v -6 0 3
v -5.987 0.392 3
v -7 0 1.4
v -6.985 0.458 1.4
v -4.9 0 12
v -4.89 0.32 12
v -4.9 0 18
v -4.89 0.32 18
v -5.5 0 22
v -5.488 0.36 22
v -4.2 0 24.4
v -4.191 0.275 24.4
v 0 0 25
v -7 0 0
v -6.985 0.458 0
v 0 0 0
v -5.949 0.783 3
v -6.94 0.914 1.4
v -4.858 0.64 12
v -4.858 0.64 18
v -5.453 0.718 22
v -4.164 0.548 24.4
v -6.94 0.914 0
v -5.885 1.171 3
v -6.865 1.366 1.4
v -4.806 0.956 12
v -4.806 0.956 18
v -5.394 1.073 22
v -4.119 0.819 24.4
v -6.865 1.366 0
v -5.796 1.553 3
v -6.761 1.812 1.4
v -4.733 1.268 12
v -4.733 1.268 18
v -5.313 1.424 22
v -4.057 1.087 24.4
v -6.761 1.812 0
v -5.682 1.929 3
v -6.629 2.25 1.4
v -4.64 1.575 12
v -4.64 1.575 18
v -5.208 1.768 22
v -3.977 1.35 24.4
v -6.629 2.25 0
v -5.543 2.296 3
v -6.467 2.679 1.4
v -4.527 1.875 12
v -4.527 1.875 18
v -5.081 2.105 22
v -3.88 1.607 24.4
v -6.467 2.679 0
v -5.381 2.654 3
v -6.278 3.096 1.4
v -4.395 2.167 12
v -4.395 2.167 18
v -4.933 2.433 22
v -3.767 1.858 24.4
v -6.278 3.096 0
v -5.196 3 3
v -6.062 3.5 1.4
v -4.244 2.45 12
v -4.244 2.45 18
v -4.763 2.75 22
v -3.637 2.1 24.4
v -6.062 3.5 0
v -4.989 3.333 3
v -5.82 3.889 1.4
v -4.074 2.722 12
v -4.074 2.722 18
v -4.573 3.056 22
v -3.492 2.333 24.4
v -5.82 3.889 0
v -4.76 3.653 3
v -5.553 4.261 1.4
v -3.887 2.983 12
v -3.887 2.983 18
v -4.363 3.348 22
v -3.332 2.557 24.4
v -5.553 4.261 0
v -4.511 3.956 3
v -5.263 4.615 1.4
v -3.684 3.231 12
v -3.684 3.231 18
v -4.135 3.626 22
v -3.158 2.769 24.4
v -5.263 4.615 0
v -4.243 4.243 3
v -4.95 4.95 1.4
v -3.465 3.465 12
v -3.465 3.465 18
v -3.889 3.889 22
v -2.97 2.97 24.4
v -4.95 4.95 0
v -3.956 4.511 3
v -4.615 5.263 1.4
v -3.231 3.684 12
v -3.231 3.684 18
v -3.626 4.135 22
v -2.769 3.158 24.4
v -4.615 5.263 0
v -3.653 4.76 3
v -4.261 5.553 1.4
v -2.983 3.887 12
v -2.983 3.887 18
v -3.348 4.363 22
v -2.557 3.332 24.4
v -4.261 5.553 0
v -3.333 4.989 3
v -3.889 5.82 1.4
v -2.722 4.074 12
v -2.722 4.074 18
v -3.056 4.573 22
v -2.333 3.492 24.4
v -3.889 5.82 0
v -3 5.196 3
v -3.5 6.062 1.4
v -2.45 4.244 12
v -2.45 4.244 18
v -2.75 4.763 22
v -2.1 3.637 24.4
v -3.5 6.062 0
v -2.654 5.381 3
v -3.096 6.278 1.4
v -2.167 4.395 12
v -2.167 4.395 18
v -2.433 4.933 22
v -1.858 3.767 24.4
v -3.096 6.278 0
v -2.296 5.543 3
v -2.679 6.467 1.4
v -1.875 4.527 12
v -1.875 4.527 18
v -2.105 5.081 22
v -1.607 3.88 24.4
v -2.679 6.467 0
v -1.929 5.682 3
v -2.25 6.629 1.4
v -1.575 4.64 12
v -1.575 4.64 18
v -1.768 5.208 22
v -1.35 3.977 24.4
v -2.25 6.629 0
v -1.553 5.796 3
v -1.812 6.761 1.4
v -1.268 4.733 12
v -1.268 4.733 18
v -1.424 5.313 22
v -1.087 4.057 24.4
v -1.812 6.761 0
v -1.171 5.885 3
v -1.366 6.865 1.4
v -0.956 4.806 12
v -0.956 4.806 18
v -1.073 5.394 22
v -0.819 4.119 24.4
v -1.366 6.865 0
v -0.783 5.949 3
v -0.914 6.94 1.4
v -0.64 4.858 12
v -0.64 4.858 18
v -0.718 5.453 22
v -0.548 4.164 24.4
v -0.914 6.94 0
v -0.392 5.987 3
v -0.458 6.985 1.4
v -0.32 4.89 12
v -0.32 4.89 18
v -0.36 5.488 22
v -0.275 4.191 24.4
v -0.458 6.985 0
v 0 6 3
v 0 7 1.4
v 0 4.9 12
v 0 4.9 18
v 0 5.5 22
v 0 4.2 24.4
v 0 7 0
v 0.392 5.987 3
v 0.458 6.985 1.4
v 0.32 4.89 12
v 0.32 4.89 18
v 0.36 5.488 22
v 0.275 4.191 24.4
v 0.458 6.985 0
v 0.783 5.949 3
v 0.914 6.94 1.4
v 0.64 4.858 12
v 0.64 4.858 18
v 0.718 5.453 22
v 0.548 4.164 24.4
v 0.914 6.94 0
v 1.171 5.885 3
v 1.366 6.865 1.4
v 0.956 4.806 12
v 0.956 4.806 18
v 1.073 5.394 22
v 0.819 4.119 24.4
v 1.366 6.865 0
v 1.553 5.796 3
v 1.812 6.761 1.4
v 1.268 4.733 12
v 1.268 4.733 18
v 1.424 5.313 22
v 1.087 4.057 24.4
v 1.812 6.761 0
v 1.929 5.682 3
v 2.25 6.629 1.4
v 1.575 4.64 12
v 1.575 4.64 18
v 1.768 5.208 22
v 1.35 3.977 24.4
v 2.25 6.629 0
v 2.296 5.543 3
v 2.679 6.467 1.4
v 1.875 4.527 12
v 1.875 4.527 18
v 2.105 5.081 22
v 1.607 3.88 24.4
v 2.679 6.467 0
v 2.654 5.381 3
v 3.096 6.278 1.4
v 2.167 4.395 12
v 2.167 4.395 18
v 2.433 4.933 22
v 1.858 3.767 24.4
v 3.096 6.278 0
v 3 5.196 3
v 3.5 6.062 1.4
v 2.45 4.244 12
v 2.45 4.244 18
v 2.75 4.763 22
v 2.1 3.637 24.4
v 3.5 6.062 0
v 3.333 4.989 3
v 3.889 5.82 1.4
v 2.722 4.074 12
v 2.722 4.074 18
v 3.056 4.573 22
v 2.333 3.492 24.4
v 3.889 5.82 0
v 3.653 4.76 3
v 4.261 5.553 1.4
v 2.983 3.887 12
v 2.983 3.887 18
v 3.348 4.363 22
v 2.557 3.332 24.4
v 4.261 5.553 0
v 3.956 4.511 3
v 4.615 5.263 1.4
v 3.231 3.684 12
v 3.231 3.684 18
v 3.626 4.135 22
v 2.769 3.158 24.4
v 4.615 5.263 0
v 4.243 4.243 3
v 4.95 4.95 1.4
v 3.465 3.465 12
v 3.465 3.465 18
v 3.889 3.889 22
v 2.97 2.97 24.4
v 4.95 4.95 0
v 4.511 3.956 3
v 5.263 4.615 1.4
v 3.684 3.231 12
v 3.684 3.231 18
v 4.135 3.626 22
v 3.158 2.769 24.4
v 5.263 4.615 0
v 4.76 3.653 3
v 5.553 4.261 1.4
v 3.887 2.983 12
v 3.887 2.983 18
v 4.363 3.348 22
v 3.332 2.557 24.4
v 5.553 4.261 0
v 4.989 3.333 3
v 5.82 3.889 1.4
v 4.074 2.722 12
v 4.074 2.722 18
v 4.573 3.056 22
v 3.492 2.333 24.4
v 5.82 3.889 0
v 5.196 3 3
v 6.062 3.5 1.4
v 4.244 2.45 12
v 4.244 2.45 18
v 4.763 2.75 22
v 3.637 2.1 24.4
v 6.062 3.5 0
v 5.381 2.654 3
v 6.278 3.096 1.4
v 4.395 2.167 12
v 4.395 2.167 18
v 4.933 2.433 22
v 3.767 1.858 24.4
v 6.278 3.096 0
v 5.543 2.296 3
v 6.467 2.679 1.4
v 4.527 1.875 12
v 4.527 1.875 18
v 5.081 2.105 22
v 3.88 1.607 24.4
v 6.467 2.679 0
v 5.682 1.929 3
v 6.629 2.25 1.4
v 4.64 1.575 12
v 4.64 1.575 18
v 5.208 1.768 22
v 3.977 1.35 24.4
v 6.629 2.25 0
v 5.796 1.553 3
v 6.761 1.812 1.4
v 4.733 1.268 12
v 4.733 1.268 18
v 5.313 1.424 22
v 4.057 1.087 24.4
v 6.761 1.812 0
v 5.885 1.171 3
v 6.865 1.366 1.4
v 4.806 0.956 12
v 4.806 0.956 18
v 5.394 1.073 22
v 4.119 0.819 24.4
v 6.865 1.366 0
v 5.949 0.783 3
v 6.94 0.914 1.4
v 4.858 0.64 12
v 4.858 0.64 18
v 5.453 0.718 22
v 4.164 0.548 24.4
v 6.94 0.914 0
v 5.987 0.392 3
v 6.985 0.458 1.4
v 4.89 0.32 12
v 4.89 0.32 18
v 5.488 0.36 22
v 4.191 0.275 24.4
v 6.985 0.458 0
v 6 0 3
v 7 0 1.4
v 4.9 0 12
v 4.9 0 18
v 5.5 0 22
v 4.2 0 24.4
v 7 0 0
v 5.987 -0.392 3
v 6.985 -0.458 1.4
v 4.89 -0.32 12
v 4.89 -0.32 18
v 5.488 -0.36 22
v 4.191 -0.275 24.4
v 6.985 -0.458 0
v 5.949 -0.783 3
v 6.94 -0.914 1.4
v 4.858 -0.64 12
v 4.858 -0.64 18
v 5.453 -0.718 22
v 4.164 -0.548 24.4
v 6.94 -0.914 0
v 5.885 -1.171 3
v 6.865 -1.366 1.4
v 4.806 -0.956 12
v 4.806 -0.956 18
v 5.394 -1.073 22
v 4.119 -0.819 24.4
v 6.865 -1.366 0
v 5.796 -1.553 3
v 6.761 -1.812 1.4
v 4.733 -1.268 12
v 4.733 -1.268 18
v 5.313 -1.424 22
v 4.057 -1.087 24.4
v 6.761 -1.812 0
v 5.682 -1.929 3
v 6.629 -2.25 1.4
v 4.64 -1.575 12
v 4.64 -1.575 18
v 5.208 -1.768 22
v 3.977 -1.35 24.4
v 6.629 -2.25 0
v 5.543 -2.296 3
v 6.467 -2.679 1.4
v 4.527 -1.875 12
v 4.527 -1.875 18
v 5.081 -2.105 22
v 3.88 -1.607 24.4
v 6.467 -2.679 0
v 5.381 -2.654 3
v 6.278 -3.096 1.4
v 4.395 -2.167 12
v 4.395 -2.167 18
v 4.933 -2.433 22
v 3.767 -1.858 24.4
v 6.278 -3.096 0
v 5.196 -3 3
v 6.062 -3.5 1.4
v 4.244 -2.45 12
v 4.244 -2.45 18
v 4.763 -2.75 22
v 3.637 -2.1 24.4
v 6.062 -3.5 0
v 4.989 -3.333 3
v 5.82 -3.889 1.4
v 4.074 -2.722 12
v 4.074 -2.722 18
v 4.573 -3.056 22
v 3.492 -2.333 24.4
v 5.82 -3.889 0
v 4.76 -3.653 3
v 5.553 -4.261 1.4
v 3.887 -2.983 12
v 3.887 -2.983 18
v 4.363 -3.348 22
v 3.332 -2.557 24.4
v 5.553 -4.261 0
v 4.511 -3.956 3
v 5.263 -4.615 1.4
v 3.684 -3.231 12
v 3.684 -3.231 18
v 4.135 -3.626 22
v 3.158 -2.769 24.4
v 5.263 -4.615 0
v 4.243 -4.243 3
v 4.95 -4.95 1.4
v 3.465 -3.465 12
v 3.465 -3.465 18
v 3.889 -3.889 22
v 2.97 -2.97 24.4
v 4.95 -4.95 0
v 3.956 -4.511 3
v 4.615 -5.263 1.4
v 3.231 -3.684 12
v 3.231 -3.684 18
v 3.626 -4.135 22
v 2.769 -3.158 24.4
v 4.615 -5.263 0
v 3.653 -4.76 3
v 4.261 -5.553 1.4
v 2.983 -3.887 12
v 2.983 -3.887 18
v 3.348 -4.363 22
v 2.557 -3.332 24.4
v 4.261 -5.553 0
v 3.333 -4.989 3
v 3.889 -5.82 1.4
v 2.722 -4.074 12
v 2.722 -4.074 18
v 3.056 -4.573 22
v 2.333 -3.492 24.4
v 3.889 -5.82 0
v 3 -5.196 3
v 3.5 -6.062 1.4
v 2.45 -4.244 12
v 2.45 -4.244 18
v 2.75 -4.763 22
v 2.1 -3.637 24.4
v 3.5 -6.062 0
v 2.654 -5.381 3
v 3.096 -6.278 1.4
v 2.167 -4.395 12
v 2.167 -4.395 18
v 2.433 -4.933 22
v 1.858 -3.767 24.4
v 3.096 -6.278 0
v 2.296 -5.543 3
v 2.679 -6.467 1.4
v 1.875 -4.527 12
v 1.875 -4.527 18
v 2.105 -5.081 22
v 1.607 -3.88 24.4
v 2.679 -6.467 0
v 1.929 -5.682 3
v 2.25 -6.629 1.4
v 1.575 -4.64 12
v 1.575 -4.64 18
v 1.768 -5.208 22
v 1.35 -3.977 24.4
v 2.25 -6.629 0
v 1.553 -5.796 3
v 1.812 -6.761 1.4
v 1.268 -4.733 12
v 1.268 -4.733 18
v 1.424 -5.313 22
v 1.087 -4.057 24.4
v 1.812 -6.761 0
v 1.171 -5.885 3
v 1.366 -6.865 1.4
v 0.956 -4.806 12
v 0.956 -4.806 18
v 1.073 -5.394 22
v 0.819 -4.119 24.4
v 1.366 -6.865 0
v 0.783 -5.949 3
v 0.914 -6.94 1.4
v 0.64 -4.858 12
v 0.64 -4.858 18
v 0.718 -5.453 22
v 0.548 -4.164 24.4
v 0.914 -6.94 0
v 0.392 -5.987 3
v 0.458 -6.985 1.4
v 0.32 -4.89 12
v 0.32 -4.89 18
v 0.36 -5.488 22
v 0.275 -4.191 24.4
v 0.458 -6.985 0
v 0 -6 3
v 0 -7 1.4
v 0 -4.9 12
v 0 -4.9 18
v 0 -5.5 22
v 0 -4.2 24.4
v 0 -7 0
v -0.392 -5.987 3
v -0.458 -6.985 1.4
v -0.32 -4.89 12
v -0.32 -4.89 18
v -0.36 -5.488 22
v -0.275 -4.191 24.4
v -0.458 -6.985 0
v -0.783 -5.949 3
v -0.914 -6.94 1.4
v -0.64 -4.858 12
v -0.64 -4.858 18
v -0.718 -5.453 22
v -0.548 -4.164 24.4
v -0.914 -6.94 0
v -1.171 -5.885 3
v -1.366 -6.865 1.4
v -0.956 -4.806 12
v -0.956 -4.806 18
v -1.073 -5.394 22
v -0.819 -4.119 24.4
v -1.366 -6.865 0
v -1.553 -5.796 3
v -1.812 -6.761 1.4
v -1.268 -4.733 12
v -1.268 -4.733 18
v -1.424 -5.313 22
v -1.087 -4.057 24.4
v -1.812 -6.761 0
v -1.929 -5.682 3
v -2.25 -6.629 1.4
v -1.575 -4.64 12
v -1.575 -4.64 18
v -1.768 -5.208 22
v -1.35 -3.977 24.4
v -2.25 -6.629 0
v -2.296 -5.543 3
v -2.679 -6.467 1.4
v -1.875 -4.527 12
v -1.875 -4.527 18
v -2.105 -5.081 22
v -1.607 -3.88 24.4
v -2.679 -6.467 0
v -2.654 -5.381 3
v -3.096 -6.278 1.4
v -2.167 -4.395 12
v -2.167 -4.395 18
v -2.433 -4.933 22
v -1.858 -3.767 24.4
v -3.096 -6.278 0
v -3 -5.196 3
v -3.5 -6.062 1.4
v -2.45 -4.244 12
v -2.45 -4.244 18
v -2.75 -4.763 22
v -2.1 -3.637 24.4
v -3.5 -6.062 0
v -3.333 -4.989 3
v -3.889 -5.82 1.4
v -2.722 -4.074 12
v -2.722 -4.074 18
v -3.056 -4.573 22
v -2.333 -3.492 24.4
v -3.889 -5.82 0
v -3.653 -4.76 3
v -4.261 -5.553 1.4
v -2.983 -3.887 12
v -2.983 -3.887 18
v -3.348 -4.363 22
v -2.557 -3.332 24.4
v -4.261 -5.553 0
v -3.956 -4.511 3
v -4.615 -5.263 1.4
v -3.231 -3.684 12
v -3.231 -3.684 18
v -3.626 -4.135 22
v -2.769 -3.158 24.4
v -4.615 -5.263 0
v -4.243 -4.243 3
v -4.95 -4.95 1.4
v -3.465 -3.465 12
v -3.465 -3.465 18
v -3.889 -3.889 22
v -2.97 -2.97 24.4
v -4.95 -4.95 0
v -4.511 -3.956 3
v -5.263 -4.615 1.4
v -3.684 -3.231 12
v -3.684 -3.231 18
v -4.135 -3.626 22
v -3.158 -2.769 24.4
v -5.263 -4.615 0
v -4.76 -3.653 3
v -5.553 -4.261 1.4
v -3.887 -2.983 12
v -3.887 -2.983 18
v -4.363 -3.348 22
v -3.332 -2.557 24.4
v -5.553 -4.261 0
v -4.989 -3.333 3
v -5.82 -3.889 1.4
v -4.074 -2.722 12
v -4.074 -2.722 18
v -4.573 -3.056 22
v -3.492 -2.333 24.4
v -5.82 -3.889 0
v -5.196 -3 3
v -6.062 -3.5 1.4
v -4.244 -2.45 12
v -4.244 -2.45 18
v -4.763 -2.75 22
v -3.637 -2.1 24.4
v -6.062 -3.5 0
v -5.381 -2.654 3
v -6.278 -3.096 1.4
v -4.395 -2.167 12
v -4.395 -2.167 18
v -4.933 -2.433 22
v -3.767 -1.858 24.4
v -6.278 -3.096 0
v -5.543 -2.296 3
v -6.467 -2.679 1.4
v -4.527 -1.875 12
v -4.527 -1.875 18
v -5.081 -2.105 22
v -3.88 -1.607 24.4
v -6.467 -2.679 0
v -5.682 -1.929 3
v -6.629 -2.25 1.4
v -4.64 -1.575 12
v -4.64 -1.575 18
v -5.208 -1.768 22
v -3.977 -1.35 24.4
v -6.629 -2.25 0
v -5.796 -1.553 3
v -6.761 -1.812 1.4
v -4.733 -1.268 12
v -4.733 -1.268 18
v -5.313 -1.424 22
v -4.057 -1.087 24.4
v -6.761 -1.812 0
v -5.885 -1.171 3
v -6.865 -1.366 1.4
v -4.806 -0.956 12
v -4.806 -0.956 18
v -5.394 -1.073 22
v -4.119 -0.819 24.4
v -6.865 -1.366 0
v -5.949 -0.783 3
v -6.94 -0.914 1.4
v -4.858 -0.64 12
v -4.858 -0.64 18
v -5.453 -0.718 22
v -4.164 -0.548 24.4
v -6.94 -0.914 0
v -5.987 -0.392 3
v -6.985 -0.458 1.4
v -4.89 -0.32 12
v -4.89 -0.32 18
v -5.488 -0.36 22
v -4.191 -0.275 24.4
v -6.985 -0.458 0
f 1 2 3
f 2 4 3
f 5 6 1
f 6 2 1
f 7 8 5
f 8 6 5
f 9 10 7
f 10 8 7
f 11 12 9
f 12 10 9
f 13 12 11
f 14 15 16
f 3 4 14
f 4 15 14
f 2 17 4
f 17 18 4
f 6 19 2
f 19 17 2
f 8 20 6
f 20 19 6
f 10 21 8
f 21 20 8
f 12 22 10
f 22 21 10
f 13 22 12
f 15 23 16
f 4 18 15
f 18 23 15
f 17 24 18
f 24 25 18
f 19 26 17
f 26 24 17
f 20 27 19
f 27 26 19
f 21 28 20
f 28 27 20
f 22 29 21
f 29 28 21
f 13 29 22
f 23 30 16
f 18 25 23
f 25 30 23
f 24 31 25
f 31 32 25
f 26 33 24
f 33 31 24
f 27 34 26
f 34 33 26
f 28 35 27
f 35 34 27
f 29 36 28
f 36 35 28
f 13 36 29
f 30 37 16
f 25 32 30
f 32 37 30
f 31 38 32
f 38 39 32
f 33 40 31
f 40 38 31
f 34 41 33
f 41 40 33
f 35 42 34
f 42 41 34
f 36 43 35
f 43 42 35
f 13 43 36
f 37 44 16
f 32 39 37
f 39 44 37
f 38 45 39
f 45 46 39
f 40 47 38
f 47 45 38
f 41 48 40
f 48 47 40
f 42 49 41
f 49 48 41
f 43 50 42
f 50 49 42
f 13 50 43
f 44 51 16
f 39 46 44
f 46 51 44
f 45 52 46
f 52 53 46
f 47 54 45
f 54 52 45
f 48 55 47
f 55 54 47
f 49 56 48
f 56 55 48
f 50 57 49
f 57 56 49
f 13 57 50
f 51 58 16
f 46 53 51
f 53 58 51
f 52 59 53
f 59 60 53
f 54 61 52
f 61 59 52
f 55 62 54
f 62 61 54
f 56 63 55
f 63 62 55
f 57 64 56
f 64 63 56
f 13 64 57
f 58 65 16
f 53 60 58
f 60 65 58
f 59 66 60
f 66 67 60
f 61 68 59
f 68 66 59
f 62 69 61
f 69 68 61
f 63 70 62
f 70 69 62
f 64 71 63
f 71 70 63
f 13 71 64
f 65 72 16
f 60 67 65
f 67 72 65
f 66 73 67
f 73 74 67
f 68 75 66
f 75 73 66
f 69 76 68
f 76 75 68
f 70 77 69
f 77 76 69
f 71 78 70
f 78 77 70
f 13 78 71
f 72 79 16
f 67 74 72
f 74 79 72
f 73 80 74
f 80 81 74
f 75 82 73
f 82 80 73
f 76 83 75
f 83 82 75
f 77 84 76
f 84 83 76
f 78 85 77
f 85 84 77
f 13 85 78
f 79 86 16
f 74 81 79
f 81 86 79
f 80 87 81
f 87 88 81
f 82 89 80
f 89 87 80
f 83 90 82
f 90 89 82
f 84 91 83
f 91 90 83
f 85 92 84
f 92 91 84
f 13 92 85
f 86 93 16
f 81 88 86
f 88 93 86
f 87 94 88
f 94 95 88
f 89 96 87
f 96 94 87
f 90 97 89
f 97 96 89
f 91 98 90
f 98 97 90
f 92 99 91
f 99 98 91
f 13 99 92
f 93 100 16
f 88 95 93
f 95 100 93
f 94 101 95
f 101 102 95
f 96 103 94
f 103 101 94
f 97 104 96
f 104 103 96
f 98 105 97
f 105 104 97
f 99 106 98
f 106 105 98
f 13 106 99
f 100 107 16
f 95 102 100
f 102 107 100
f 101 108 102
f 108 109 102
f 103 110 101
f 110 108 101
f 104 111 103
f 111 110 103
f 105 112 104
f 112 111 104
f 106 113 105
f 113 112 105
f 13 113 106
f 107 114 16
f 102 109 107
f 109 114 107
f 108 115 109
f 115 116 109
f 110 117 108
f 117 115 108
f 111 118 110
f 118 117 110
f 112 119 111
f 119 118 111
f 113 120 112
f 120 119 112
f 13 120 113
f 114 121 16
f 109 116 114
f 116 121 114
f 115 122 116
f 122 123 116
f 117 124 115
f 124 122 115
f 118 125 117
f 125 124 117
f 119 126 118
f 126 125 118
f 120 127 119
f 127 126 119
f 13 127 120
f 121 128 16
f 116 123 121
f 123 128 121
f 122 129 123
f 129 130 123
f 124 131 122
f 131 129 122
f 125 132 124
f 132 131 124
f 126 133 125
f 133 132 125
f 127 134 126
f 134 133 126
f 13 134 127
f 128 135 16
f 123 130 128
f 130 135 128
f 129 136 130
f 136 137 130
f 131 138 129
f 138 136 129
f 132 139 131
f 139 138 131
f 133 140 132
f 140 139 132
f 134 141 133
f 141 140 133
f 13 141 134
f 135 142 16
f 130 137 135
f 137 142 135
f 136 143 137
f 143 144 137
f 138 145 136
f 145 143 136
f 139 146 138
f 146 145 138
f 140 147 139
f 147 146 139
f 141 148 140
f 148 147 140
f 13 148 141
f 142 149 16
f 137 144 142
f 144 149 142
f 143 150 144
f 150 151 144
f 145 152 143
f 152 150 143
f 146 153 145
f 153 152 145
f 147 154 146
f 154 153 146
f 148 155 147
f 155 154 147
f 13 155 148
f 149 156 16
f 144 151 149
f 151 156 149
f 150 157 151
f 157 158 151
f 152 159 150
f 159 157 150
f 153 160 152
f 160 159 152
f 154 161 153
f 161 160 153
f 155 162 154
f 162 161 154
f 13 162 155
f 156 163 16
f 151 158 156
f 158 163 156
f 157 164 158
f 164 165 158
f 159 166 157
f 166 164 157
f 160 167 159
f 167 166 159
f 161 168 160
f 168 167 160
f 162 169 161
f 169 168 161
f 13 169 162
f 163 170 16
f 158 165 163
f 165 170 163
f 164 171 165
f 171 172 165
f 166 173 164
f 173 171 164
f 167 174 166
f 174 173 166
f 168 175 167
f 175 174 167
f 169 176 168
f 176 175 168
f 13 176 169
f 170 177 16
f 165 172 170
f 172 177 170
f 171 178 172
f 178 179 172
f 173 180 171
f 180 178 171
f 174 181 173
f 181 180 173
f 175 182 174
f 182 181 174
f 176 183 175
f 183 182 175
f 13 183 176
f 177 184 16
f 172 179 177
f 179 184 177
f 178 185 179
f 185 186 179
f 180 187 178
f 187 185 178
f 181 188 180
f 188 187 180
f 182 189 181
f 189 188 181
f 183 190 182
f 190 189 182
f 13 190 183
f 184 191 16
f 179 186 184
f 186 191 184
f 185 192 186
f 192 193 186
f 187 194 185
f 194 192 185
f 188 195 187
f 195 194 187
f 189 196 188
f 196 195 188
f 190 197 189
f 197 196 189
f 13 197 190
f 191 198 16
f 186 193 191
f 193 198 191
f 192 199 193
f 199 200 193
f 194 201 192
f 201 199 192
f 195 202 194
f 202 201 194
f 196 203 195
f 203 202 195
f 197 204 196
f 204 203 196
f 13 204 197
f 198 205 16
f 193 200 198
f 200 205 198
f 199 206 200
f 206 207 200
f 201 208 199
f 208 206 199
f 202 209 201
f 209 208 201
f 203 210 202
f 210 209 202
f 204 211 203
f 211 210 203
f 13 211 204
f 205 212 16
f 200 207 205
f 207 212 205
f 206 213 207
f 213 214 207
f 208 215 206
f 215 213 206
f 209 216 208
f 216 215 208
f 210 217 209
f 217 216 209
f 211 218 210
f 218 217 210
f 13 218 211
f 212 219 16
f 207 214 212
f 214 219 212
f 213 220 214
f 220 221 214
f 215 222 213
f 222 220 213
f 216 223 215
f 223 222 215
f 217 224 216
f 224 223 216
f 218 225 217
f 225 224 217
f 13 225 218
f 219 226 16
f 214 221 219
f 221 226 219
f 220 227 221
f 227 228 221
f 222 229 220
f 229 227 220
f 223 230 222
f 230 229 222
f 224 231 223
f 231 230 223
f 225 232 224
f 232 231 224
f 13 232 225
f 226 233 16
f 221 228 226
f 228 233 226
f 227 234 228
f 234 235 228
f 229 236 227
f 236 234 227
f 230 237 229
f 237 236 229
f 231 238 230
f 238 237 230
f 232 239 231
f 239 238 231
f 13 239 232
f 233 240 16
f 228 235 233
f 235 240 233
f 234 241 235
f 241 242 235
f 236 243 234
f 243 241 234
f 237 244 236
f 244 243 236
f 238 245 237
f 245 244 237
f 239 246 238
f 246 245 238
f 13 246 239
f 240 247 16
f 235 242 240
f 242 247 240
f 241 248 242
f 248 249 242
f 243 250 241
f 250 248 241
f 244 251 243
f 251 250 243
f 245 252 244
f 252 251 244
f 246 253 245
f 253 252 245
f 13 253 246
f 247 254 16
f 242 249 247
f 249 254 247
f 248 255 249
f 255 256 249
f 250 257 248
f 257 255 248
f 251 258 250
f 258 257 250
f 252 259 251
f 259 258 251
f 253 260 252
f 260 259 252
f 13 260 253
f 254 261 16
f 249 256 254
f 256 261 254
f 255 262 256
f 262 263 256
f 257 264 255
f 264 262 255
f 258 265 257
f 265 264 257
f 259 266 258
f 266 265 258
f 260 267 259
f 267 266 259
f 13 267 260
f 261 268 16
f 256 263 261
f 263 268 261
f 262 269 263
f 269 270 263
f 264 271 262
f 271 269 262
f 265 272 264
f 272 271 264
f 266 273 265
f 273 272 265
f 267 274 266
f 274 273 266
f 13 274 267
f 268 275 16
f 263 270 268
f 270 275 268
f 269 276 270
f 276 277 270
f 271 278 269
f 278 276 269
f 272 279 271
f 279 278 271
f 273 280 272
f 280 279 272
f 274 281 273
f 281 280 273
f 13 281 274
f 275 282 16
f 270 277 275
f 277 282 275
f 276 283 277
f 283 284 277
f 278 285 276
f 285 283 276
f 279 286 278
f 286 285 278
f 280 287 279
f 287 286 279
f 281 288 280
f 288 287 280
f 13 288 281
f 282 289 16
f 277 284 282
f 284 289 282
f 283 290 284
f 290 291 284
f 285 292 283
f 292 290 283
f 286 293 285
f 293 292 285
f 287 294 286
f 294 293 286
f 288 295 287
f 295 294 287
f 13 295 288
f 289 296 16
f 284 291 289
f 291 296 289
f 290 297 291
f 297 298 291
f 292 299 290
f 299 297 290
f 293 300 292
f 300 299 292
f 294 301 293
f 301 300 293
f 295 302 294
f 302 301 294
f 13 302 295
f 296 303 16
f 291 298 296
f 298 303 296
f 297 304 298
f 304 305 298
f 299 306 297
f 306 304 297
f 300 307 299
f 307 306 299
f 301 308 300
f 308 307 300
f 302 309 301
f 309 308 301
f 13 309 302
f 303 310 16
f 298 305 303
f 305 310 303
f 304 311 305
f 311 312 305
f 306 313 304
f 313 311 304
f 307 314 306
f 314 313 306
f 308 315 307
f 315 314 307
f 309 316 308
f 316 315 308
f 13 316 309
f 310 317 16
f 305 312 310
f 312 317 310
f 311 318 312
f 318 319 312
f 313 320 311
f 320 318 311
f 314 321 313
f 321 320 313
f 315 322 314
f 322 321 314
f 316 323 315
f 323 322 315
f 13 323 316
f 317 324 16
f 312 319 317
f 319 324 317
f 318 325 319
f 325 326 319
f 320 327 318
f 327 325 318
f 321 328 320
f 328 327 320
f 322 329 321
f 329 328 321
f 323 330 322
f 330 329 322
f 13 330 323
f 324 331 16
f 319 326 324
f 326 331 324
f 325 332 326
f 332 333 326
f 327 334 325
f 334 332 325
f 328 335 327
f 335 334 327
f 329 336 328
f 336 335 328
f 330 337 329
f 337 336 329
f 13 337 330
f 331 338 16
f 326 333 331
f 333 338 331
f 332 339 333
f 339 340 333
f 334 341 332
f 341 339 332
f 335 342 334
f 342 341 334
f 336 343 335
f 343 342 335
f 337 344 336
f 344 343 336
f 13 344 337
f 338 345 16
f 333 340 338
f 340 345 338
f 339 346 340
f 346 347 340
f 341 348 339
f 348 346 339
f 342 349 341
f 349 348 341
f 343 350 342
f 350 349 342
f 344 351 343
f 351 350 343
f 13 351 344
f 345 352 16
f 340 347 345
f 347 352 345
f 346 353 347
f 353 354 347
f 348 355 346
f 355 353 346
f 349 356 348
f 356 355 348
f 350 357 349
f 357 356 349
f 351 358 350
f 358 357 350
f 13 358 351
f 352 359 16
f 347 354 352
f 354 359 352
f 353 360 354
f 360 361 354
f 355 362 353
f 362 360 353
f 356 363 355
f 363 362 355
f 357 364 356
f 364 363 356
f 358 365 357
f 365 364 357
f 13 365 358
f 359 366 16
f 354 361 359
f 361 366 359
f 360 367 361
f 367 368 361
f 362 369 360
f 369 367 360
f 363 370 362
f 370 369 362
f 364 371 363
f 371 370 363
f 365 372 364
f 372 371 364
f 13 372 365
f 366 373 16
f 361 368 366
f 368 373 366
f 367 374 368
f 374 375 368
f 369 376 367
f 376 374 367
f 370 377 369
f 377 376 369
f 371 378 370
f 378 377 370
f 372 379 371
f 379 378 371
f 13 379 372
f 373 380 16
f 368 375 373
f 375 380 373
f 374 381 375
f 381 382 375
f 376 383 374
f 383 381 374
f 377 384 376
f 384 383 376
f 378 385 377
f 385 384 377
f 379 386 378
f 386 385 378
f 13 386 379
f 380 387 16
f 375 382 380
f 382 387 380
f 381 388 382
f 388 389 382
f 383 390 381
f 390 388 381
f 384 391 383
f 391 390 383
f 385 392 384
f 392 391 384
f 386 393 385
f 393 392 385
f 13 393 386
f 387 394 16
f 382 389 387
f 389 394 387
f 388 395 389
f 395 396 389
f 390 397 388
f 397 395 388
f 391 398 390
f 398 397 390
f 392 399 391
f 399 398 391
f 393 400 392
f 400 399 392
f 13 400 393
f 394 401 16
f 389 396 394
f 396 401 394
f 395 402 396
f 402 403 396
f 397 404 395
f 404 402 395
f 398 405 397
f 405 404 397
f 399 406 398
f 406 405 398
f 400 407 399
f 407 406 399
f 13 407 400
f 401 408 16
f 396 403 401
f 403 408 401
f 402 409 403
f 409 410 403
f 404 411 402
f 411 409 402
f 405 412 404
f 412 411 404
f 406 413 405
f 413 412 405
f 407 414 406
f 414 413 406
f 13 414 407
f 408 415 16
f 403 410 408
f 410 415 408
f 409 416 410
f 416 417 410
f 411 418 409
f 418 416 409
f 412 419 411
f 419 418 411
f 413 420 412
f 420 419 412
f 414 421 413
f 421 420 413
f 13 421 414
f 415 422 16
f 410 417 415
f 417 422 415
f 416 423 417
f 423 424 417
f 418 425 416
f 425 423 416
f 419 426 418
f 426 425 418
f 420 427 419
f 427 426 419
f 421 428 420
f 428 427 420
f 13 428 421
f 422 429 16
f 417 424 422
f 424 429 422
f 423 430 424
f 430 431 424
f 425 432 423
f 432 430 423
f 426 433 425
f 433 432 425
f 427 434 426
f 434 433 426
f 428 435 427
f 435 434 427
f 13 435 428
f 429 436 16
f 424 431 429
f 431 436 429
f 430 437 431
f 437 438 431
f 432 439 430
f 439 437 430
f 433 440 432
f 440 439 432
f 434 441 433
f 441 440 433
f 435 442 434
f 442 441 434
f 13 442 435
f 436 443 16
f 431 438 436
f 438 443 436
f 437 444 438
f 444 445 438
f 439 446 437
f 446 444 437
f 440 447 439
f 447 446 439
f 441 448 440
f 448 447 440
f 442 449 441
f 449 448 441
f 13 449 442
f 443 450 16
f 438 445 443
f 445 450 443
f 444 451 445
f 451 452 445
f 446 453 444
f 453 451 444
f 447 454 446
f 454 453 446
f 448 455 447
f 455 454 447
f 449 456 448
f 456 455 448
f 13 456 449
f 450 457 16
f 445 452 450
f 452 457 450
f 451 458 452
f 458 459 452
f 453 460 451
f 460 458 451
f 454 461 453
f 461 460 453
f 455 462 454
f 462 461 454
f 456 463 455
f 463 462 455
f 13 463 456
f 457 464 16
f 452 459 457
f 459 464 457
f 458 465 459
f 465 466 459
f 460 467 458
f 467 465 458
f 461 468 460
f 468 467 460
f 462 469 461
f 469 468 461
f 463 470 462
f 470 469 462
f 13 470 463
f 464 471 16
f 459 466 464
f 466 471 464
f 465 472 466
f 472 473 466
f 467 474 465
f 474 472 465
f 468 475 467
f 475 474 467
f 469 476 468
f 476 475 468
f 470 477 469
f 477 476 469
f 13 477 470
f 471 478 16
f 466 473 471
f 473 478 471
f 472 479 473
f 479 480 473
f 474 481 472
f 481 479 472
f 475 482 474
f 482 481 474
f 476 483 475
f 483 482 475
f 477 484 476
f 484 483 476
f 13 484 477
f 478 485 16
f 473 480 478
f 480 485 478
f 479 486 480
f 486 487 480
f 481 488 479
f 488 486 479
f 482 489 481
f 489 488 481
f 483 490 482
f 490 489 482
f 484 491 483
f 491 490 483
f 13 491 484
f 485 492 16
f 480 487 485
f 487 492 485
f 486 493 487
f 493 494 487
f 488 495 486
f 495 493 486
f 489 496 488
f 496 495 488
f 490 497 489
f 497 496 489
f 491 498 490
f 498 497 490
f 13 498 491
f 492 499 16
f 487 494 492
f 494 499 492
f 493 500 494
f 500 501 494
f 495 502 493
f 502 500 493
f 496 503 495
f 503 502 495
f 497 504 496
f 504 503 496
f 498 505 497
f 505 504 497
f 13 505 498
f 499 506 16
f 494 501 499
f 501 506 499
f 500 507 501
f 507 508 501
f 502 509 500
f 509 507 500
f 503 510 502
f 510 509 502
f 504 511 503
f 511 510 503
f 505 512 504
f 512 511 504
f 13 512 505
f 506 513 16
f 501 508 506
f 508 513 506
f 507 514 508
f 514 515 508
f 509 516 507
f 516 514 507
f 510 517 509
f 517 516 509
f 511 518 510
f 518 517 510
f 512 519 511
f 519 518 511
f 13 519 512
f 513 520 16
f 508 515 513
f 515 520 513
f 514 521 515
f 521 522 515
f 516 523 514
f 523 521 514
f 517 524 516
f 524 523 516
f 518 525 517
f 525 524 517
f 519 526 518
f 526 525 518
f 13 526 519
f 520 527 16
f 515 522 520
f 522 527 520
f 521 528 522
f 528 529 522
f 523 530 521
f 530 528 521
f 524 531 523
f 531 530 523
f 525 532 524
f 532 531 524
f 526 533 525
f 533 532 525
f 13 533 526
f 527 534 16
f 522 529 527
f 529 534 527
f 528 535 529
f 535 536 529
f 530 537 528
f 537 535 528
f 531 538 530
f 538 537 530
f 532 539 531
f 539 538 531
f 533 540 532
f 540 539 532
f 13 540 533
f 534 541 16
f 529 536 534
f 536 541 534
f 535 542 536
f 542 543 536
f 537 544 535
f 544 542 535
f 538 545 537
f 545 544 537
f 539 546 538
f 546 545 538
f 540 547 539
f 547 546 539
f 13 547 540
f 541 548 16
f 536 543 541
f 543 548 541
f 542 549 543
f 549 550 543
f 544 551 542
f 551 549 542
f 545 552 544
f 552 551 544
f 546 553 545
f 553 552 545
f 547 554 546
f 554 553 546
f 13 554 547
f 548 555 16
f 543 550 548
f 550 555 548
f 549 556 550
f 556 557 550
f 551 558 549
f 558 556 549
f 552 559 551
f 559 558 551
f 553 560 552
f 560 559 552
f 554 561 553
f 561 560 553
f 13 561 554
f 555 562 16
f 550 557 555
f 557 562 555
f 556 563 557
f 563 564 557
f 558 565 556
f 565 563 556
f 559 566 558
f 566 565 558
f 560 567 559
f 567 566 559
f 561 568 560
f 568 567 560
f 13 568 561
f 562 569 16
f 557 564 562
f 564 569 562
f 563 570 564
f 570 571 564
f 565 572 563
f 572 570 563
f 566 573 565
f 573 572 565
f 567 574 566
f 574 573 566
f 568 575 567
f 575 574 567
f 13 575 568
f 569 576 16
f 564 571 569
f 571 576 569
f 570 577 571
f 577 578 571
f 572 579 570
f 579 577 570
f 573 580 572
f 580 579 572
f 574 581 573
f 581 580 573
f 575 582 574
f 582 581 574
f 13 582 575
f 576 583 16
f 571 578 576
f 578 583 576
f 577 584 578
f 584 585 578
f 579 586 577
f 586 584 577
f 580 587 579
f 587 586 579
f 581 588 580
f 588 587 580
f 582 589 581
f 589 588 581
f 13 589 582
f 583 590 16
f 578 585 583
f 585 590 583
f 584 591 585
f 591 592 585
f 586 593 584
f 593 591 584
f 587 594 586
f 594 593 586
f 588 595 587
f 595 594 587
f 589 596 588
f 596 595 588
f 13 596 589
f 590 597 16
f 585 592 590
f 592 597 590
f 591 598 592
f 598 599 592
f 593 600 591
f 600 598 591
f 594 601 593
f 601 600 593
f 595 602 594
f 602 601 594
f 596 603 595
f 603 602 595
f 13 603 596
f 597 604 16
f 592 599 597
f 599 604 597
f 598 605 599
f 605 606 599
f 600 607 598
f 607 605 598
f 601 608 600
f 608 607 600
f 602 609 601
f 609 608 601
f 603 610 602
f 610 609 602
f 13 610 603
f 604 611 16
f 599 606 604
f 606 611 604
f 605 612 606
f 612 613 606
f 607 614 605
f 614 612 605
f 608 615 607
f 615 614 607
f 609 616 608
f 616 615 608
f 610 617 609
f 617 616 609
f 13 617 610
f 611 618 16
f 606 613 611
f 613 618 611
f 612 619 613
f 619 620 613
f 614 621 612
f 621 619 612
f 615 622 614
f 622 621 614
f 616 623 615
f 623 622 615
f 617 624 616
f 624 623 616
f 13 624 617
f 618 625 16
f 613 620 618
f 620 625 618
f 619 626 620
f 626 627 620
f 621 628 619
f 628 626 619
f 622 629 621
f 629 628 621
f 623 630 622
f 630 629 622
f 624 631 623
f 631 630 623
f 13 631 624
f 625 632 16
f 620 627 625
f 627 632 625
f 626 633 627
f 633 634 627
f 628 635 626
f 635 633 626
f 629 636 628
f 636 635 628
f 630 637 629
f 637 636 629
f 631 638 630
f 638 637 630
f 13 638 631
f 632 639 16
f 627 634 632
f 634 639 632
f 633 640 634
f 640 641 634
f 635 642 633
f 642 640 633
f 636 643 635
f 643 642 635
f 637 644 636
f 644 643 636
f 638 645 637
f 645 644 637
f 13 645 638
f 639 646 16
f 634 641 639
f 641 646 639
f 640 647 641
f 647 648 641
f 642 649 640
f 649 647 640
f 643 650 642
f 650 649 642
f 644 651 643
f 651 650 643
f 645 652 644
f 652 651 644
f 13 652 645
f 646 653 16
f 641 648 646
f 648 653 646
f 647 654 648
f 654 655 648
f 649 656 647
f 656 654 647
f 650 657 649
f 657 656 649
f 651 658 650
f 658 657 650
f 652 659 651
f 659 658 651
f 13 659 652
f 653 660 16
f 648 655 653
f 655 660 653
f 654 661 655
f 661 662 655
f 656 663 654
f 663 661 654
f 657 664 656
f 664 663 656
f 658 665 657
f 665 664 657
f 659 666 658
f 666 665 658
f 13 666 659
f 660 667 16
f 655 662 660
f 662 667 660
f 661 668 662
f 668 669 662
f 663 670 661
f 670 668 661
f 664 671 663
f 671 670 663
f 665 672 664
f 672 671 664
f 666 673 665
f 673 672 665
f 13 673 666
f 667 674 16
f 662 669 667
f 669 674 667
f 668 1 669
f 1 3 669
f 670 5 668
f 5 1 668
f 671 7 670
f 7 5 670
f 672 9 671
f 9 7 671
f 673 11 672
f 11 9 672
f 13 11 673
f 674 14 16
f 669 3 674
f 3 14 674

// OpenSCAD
// =============================================================
// handle.scad — 标准手柄参数化模板
//
// 剖面 profile = [[r, z], ...]，从底面中心出发、沿外轮廓到顶部、
// 最后回到中心轴，围成一个闭合多边形，rotate_extrude 旋转成实体。
// profile 由 src/make_handle.py 按 style 生成：
//   dome  = 现在的圆顶 + 收颈（φ14 × 25）
//   slim  = 直筒 + 顶端 R3 圆角（斜面占比 62% -> <10%）
// =============================================================

$fa = is_undef(curve_fa) ? 4 : curve_fa;
$fs = is_undef(curve_fs) ? 0.4 : curve_fs;
seg  = is_undef(seg) ? 96 : seg;

profile = is_undef(profile) ? [[0, 0], [7, 0], [7, 1.4], [6, 3], [4.9, 12],
                               [4.9, 18], [5.5, 22], [4.2, 24.4], [0, 25]]
                            : profile;

rotate_extrude(angle = 360, $fn = seg)
    polygon(points = profile);
